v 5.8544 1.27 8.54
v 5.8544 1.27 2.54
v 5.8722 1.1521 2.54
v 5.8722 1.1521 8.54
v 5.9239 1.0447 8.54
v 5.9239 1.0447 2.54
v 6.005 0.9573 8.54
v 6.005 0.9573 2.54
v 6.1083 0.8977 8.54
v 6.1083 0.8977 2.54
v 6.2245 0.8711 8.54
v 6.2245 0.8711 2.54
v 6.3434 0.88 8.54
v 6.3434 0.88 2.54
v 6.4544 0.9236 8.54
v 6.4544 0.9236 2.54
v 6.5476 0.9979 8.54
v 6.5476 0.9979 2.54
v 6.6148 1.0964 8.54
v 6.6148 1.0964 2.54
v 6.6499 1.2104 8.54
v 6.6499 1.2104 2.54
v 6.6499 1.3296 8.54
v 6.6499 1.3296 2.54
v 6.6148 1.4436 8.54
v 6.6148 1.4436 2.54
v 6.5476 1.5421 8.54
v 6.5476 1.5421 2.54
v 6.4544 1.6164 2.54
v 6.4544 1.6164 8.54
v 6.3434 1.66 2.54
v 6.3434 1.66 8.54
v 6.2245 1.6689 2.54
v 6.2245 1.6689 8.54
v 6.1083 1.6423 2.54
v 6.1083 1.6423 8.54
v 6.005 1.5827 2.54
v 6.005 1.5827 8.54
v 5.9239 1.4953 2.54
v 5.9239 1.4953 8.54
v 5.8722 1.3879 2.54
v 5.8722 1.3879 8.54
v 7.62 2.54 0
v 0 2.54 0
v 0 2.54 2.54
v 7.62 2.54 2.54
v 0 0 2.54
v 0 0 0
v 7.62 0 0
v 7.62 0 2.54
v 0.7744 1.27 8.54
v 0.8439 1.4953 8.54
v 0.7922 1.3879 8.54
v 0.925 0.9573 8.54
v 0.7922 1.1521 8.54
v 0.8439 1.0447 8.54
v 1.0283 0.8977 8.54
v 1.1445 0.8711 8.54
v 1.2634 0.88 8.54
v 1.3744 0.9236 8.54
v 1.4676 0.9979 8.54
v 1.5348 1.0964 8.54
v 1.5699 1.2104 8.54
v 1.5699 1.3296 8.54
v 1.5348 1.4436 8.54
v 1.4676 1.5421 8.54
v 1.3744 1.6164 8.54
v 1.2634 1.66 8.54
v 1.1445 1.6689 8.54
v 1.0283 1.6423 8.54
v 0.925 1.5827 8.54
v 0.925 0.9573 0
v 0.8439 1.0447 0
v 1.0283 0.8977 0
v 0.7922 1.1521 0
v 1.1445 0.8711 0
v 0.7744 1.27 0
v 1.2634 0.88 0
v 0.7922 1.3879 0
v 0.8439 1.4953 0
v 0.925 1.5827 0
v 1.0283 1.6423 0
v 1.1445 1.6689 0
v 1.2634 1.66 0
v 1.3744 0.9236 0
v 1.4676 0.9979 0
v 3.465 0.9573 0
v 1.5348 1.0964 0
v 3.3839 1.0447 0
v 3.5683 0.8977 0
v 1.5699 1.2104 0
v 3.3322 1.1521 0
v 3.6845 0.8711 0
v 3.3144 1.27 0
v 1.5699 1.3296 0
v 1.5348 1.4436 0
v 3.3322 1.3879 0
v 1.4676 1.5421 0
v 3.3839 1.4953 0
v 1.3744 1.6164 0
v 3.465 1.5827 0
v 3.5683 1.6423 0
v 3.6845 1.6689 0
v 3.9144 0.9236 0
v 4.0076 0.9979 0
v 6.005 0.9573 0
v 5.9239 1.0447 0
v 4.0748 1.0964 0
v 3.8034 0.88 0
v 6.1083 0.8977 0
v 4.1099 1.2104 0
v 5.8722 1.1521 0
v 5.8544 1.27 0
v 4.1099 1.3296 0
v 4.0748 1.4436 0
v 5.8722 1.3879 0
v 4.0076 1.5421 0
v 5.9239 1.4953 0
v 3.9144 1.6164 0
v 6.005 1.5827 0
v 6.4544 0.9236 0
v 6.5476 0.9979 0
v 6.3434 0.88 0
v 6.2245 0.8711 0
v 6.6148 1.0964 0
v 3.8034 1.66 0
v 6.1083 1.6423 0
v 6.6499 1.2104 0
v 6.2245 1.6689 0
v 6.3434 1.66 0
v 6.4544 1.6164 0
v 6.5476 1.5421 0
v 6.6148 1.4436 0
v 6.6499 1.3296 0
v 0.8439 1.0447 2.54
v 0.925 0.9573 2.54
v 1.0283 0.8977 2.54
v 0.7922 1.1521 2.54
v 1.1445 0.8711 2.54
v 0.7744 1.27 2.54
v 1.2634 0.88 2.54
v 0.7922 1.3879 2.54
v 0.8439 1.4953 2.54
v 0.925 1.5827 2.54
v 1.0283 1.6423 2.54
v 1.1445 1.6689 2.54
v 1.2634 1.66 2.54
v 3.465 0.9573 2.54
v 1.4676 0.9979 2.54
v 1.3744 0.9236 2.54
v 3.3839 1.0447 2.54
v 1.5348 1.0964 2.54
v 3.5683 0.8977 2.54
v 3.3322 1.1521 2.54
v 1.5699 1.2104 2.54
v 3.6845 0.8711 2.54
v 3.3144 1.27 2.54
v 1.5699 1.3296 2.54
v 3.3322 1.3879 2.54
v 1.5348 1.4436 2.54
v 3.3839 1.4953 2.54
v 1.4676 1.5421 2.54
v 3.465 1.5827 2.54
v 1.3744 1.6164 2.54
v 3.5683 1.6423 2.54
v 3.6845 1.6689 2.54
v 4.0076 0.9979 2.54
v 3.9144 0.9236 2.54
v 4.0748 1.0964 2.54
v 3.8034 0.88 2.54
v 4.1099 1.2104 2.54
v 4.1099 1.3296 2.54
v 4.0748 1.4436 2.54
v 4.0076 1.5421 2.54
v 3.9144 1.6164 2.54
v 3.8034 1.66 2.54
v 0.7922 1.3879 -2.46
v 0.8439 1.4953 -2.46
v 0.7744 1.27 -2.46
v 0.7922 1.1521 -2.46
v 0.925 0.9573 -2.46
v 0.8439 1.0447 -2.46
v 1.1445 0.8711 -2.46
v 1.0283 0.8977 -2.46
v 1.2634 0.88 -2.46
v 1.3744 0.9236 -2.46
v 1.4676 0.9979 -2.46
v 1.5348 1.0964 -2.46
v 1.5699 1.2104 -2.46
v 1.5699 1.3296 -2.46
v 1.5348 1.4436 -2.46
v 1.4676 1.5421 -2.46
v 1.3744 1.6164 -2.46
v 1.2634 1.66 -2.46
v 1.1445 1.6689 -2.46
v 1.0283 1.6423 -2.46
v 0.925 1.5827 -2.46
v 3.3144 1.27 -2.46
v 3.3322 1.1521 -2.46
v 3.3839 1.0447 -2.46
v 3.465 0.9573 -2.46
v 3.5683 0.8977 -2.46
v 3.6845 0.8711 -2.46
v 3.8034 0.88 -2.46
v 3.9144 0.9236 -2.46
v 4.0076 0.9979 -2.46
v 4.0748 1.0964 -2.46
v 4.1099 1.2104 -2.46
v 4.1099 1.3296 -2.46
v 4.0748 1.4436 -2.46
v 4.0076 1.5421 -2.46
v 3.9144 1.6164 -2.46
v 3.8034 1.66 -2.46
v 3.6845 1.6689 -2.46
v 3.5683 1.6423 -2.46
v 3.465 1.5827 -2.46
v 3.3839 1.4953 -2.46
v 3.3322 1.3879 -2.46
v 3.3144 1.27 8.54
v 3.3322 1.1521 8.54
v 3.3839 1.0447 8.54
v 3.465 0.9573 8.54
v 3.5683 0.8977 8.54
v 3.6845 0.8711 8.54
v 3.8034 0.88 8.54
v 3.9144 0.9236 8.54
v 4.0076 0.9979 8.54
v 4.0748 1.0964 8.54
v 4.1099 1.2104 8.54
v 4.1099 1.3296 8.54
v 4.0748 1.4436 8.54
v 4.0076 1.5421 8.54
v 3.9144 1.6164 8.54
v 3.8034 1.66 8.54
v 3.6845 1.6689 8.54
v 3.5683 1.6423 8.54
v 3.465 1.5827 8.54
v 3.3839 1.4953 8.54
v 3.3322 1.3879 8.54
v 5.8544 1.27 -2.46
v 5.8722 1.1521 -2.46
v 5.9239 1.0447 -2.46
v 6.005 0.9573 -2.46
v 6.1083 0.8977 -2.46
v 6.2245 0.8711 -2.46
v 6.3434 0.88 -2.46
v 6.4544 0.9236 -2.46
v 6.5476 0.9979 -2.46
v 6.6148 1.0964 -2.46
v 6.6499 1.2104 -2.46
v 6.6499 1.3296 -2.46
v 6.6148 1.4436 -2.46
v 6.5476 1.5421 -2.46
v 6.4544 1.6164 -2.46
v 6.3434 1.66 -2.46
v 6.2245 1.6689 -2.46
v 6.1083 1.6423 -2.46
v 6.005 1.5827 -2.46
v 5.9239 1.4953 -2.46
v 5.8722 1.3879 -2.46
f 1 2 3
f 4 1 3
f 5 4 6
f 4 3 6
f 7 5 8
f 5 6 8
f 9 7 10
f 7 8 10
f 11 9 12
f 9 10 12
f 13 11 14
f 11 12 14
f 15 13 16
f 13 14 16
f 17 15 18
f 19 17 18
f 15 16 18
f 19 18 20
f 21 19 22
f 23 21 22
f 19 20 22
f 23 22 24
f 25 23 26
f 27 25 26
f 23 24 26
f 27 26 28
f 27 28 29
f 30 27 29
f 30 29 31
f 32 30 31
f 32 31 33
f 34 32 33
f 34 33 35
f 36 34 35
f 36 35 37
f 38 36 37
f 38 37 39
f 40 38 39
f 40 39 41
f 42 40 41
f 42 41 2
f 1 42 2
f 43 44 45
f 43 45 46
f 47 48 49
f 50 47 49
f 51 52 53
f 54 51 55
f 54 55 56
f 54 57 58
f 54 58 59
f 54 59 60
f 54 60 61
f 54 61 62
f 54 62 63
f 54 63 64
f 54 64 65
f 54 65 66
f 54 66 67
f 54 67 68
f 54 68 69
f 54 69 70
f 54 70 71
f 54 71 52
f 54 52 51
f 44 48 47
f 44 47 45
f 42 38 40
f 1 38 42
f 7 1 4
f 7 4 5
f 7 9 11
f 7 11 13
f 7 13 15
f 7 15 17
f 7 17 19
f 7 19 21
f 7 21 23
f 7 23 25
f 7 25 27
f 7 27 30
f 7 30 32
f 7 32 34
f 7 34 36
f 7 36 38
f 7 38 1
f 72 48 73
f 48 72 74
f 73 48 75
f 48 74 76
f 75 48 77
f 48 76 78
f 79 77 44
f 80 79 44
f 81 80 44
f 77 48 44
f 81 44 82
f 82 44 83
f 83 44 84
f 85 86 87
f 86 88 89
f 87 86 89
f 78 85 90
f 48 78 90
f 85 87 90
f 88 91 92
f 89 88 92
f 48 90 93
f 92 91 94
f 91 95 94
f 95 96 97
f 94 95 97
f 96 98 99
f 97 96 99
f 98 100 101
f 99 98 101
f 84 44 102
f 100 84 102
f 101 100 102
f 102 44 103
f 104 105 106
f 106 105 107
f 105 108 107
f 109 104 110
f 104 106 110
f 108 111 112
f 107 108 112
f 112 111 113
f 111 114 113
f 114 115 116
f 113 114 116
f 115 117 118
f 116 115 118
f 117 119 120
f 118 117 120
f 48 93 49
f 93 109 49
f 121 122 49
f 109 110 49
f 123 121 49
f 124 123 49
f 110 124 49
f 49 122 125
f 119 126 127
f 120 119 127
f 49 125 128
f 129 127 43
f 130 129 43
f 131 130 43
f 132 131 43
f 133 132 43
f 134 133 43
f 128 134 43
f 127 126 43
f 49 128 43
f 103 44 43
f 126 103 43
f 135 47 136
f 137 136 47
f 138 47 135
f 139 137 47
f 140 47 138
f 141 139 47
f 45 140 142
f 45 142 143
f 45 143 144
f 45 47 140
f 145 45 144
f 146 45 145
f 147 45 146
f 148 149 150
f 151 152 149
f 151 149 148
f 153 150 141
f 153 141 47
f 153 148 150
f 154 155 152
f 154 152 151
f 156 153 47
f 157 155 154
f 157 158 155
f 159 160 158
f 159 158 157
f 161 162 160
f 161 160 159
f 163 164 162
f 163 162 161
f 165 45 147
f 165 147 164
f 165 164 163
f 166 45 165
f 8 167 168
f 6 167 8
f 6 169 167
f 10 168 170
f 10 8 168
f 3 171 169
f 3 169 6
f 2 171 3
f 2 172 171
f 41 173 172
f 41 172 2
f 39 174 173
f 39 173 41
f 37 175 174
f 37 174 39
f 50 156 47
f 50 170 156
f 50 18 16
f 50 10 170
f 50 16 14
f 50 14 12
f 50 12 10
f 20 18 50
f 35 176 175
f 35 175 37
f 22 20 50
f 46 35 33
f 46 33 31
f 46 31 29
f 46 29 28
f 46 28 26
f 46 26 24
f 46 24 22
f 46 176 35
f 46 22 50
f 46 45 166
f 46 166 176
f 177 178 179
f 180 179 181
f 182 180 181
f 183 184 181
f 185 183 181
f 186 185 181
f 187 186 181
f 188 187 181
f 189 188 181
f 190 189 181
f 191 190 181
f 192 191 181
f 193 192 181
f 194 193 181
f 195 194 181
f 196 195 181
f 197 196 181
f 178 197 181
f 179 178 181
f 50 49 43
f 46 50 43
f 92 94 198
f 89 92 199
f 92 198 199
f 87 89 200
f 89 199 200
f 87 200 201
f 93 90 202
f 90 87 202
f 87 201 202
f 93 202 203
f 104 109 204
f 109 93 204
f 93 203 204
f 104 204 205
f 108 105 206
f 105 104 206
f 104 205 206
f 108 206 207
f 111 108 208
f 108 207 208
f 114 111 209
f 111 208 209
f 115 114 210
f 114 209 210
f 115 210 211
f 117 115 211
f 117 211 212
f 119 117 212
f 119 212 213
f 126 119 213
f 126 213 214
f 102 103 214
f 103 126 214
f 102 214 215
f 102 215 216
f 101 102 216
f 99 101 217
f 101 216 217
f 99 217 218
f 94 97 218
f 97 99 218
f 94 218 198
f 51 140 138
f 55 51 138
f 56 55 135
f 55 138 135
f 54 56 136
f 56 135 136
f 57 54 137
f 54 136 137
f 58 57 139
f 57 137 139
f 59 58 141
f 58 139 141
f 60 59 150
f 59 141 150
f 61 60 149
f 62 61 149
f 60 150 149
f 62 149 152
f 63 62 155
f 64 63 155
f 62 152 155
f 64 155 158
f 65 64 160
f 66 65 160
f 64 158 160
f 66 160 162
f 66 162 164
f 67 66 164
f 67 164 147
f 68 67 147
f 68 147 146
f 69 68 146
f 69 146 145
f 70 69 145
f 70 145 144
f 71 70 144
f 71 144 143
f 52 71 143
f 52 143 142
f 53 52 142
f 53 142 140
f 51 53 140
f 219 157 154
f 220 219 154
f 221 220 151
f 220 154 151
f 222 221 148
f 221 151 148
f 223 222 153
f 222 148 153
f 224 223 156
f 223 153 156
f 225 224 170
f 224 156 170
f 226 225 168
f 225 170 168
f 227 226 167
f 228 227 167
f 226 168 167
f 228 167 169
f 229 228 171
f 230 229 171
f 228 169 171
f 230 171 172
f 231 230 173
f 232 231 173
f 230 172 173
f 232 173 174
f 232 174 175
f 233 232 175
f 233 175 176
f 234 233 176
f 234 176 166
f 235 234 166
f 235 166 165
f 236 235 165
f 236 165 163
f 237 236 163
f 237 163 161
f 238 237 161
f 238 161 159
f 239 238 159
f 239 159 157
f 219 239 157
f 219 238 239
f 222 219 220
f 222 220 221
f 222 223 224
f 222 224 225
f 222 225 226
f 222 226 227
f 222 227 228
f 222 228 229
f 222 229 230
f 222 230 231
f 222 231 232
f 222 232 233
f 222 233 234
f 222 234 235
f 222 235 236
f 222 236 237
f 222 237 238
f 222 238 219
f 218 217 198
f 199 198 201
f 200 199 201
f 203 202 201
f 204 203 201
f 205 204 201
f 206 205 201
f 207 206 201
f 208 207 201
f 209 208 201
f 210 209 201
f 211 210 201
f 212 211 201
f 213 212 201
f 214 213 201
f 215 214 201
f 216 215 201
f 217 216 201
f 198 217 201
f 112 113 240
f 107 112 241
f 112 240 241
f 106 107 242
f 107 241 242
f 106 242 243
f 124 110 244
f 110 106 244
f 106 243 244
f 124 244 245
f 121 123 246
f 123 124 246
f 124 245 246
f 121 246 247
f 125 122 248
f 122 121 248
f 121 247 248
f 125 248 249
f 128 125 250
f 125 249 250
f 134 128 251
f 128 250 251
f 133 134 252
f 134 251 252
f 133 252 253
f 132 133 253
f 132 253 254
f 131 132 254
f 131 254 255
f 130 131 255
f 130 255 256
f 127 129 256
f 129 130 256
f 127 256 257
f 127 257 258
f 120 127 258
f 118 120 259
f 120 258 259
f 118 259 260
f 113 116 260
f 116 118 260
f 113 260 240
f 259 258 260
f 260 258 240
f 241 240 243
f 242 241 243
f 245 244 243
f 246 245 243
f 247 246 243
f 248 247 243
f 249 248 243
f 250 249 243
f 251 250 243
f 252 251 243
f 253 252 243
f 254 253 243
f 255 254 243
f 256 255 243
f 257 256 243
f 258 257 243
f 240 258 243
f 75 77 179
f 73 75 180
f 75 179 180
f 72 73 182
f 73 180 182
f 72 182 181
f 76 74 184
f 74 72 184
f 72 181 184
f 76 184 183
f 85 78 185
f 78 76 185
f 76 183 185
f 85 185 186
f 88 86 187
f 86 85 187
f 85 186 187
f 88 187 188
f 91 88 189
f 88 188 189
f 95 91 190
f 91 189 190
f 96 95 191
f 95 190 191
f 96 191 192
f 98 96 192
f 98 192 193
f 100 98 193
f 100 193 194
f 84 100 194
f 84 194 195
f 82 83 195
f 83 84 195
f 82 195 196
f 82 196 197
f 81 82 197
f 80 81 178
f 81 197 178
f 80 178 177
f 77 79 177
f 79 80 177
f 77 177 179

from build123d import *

# Parameters (mm, degrees)
SKETCH_1_W           = 7.62
SKETCH_1_H           = 2.54
EXTRUDE_1_DEPTH      = 2.54
EXTRUDE_2_DEPTH      = 6
EXTRUDE_2_DEPTH_BACK = 5
SKETCH_2_R           = 0.4


with BuildPart() as part:
    # Эскиз1 → Вытянуть1 (new body)
    with BuildSketch(Plane.XY):
        with Locations((3.81, 1.27)):
            Rectangle(SKETCH_1_W, SKETCH_1_H)
    extrude(amount=EXTRUDE_1_DEPTH)

    # Эскиз2 → Вытянуть2 (add, two sides: drawn at the far end of the back side and taken through both)
    with BuildSketch(Plane.XY.offset(2.54).offset(-EXTRUDE_2_DEPTH_BACK)):
        with Locations((1.174408602, 1.27)):
            Circle(SKETCH_2_R)
        with Locations((3.714408602, 1.27)):
            Circle(SKETCH_2_R)
        with Locations((6.254408602, 1.27)):
            Circle(SKETCH_2_R)
    extrude(amount=EXTRUDE_2_DEPTH + EXTRUDE_2_DEPTH_BACK)


solid = part.part
